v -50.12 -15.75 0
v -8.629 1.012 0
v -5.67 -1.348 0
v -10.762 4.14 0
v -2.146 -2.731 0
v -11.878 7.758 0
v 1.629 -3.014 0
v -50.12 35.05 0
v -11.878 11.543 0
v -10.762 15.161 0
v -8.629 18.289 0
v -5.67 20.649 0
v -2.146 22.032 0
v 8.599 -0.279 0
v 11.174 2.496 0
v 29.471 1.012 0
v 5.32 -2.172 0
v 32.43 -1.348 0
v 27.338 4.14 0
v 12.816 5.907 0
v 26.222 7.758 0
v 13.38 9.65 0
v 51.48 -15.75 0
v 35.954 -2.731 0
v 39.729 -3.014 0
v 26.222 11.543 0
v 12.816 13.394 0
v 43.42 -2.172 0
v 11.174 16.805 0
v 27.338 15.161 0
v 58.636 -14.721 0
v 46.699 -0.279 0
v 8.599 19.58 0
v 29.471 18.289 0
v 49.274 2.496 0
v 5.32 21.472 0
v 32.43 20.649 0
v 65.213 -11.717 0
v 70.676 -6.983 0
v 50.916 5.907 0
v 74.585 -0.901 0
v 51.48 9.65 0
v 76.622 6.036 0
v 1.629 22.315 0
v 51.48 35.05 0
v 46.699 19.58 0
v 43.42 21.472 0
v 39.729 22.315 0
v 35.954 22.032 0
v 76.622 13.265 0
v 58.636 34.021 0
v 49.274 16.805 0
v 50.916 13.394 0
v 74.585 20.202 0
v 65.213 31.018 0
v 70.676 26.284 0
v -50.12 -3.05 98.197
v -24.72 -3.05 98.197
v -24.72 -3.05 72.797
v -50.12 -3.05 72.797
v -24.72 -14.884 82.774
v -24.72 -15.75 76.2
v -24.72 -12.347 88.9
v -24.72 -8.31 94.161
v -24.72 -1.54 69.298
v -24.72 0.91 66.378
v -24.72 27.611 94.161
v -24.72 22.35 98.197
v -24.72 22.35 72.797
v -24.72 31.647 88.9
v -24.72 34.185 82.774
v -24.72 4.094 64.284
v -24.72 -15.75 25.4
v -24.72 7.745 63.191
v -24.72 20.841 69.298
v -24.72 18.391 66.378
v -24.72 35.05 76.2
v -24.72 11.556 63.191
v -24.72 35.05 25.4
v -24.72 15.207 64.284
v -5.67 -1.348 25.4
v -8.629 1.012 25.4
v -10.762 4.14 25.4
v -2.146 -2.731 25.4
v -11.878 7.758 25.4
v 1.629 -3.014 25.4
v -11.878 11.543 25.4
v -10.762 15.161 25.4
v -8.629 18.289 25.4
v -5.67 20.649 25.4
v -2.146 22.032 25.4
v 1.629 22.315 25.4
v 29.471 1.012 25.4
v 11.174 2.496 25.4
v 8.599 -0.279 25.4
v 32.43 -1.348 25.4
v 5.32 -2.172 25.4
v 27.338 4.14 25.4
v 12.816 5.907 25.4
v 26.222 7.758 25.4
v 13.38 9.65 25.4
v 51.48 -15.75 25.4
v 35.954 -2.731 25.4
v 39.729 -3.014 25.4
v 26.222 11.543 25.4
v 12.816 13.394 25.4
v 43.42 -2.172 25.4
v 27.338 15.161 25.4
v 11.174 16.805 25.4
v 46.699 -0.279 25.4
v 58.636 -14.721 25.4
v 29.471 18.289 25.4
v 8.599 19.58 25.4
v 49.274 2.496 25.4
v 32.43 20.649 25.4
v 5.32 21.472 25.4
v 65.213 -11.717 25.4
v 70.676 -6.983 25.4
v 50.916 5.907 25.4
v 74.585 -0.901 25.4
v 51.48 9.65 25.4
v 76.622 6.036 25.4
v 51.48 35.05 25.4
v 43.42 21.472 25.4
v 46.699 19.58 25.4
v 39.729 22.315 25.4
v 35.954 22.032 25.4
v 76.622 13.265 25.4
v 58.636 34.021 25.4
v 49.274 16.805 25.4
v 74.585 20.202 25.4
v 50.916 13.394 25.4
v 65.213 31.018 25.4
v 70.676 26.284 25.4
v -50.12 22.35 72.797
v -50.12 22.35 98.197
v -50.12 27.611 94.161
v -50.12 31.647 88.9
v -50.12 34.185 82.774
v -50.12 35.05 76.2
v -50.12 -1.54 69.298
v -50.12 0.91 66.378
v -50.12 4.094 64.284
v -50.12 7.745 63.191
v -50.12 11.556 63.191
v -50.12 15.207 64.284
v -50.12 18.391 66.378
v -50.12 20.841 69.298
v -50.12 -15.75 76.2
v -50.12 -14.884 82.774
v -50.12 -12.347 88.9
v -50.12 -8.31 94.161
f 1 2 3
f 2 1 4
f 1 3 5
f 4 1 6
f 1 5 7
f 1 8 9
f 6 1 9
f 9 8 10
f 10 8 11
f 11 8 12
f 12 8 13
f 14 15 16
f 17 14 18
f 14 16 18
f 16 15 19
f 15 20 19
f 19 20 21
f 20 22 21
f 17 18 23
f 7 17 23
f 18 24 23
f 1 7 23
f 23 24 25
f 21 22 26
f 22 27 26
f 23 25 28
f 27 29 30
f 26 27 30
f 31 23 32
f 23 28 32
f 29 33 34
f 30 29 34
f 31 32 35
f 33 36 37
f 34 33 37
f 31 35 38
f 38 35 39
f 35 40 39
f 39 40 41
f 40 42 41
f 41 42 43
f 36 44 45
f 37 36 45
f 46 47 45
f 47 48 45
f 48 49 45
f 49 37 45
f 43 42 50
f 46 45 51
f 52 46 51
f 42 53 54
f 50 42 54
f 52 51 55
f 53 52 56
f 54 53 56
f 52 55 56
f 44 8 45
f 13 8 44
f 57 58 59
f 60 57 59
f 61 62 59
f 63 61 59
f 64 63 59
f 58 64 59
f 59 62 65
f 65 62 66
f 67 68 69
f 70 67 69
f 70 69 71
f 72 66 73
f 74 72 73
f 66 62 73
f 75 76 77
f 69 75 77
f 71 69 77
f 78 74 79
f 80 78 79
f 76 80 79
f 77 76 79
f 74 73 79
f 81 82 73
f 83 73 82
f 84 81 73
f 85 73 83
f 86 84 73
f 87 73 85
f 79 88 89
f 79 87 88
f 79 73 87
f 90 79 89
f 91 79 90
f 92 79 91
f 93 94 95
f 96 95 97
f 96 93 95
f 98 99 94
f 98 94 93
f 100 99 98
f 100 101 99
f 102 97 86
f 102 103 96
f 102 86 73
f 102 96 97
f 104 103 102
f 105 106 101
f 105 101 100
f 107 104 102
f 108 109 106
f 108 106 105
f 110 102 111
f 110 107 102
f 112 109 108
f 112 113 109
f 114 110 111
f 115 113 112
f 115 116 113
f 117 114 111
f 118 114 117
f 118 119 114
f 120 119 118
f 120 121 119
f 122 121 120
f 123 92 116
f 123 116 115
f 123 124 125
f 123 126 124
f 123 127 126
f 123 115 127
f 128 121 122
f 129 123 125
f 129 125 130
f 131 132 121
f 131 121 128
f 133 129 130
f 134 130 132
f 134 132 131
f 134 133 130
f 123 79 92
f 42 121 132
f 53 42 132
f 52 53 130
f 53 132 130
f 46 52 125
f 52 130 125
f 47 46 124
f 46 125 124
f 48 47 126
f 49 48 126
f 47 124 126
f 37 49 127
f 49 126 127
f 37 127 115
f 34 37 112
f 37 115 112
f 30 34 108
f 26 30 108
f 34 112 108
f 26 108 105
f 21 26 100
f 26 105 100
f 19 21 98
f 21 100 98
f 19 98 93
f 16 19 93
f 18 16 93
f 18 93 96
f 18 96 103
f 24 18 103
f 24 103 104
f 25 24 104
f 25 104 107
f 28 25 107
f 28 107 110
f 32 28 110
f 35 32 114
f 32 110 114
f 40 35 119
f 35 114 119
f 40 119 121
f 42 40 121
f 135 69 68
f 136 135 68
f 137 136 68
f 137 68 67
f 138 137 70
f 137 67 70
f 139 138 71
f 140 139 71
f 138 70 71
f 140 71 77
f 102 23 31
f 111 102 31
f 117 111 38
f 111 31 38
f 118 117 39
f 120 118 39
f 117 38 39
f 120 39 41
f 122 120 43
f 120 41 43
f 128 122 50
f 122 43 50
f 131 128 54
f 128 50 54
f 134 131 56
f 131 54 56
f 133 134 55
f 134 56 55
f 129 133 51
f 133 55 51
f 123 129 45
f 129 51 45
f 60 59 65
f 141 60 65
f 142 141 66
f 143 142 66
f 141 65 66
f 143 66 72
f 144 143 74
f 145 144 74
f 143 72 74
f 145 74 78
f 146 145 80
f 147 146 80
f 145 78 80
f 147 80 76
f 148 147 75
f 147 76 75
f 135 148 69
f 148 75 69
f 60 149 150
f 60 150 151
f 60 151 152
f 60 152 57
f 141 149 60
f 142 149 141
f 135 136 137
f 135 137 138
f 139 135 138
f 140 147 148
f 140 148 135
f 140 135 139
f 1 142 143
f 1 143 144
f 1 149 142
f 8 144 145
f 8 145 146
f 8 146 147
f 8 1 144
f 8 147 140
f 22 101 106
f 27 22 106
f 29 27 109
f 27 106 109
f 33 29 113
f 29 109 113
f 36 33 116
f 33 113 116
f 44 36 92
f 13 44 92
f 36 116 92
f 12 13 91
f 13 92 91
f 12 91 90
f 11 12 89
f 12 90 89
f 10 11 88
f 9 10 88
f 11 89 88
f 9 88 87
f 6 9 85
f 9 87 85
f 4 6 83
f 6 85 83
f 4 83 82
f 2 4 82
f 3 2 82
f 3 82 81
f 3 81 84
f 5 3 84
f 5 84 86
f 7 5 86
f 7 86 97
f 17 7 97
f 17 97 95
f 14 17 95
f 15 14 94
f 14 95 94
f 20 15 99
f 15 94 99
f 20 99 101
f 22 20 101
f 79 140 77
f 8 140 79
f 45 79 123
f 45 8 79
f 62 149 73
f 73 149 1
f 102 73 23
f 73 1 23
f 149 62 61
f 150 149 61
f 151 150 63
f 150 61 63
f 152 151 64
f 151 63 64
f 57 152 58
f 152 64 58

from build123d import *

# Parameters (mm, degrees)
F1_DEPTH  = 25.4
F2_R      = 12.7
F3_DEPTH  = 25.4
F4_R      = 12.7
F5_DEPTH  = 25.4
F6_W      = 25.4
F6_H      = 50.8
F7_DEPTH  = 76.2
F9_DEPTH  = 25.4
F11_DEPTH = 25.4
F13_DEPTH = 25.4


with BuildPart() as f1:
    # F0 (on Top) → F1 (new body)
    with BuildSketch(Plane.XY):
        with BuildLine():
            ThreePointArc((51.4803717834, -15.7496363992), (76.8803717834, 9.6503636008), (51.4803717834, 35.0503636008))
            Line((51.4803717834, 35.0503636008), (-50.1196282166, 35.0503636008))
            Line((-50.1196282166, 35.0503636008), (-50.1196282166, -15.7496363992))
            Line((-50.1196282166, -15.7496363992), (51.4803717834, -15.7496363992))
        make_face()
    extrude(amount=F1_DEPTH)

    # F2 (on face) → F3 (cut)
    with BuildSketch(Plane.XY.offset(25.4)):
        with Locations((0.6803717834, 9.6503636008)):
            Circle(F2_R)
    extrude(amount=-F3_DEPTH, mode=Mode.SUBTRACT)

    # F4 (on face) → F5 (cut)
    with BuildSketch(Plane.XY.offset(25.4)):
        with Locations((38.7803717834, 9.6503636008)):
            Circle(F4_R)
    extrude(amount=-F5_DEPTH, mode=Mode.SUBTRACT)

    # F6 (on face) → F7 (join)
    with BuildSketch(Plane.XY.offset(25.4)):
        with Locations((-37.4196282166, 9.6503636008)):
            Rectangle(F6_W, F6_H)
    extrude(amount=F7_DEPTH)

    # F8 (on face) → F9 (cut)
    with BuildSketch(Plane.YZ.offset(-24.7196282166)):
        with BuildLine():
            ThreePointArc((9.6503637335, 101.6), (27.6108758899, 94.1605121953), (35.0503636008, 76.2))
            Line((35.0503636008, 76.2), (35.0503636008, 101.6))
            Line((35.0503636008, 101.6), (9.6503637335, 101.6))
        make_face()
    extrude(amount=-F9_DEPTH, mode=Mode.SUBTRACT)

    # F10 (on face) → F11 (cut)
    with BuildSketch(Plane.YZ.offset(-24.7196282166)):
        with BuildLine():
            ThreePointArc((-15.7496363992, 76.2), (-8.31014861, 94.1605122734), (9.6503636892, 101.6))
            Line((9.6503636008, 101.6), (-15.7496363992, 101.6))
            Line((-15.7496363992, 101.6), (-15.7496363992, 76.2))
        make_face()
    extrude(amount=-F11_DEPTH, mode=Mode.SUBTRACT)

    # F12 (on face) → F13 (cut)
    with BuildSketch(Plane.YZ.offset(-24.7196282166)):
        with BuildLine():
            ThreePointArc((9.6503636892, 101.6), (3.0763598979, 100.7345159992), (-3.0496363992, 98.1970452561))
            Line((-3.0496363992, 98.1970452561), (-3.0496363992, 79.6029547439))
            Line((-3.0496363992, 79.6029547439), (-3.0496363992, 72.7970452561))
            ThreePointArc((-3.0496363992, 72.7970452561), (9.6503636008, 63.0519925088), (22.3503636008, 72.7970452561))
            Line((22.3503636008, 72.7970452561), (22.3503636008, 79.6029547439))
            Line((22.3503636008, 79.6029547439), (22.3503636008, 98.1970452561))
            ThreePointArc((22.3503636008, 98.1970452561), (16.2243674105, 100.7345159706), (9.6503637335, 101.6))
        make_face()
    extrude(amount=-F13_DEPTH, mode=Mode.SUBTRACT)


solid = f1.part
